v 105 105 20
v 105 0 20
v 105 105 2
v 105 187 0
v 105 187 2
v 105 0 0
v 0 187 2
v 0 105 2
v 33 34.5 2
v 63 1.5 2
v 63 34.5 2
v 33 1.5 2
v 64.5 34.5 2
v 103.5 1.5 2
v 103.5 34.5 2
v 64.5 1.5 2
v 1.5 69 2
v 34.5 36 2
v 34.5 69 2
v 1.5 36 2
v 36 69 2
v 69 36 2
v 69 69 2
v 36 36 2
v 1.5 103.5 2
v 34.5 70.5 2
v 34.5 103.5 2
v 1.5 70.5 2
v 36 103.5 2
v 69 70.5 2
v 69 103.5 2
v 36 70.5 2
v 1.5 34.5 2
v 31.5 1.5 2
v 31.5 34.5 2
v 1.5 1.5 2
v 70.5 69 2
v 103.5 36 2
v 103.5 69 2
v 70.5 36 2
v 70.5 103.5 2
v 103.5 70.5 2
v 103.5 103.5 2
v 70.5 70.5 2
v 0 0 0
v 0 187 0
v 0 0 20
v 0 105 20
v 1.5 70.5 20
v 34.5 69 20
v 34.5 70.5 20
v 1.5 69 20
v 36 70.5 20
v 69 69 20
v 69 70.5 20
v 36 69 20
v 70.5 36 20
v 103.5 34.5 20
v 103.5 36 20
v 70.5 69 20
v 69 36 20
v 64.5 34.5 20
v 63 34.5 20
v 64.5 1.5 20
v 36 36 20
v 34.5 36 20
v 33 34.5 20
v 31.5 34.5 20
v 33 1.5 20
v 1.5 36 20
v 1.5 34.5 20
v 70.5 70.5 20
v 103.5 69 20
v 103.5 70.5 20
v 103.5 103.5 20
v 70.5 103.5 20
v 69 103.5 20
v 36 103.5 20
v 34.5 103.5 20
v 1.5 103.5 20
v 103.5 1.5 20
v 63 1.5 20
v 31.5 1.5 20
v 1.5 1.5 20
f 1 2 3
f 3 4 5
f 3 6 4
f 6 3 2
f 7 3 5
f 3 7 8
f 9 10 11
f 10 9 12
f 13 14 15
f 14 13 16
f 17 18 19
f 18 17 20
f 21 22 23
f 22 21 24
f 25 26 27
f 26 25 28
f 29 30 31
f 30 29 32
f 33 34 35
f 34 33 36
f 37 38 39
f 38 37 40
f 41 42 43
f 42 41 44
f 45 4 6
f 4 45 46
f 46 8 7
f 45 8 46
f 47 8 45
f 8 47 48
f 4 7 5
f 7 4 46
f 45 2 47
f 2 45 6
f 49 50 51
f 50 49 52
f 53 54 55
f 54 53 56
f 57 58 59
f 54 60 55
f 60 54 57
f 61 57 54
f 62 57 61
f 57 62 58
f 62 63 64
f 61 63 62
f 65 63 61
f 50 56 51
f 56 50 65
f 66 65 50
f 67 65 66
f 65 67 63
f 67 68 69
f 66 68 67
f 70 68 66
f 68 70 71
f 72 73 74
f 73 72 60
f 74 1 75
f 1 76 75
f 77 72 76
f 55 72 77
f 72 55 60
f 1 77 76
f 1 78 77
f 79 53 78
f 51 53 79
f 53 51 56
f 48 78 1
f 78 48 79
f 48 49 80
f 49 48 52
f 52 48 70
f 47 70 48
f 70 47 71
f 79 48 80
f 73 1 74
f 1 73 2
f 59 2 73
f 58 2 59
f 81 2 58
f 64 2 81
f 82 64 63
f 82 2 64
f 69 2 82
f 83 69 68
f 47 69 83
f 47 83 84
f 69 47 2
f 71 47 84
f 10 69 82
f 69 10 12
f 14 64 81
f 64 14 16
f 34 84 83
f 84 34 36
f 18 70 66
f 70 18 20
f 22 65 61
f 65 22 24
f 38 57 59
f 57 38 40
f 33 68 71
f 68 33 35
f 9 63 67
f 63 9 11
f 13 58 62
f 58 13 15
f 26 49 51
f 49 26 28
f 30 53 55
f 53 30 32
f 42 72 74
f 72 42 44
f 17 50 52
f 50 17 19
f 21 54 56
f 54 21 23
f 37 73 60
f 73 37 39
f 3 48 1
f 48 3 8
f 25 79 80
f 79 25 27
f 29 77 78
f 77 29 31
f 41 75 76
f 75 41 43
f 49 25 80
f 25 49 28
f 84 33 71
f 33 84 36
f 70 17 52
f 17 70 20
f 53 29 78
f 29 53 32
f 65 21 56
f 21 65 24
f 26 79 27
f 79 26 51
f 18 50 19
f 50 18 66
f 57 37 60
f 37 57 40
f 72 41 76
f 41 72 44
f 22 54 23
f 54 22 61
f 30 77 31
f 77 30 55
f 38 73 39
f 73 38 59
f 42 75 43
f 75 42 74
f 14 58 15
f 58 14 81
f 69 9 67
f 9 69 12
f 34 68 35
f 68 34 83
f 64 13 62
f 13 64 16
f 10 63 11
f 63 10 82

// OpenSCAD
union(){
    
  cube ([105,187,2]);
  translate([0,0,0]) cube ([105,1.5,20]);   
  translate([0,34.5,0]) cube ([105,1.5,20]);   
  translate([0,69,0]) cube ([105,1.5,20]);  
  translate([0,103.5,0]) cube ([105,1.5,20]);   
  translate([0,0,0]) cube ([1.5,105,20]);   
  translate([34.5,34.5,0]) cube ([1.5,70.5,20]);   
translate([69,34.5,0]) cube ([1.5,70.5,20]);   
translate([103.5,0,0]) cube ([1.5,105,20]);   
translate([31.5,0,0]) cube ([1.5,34.5,20]);   
translate([63,0,0]) cube ([1.5,34.5,20]);   


}
    
